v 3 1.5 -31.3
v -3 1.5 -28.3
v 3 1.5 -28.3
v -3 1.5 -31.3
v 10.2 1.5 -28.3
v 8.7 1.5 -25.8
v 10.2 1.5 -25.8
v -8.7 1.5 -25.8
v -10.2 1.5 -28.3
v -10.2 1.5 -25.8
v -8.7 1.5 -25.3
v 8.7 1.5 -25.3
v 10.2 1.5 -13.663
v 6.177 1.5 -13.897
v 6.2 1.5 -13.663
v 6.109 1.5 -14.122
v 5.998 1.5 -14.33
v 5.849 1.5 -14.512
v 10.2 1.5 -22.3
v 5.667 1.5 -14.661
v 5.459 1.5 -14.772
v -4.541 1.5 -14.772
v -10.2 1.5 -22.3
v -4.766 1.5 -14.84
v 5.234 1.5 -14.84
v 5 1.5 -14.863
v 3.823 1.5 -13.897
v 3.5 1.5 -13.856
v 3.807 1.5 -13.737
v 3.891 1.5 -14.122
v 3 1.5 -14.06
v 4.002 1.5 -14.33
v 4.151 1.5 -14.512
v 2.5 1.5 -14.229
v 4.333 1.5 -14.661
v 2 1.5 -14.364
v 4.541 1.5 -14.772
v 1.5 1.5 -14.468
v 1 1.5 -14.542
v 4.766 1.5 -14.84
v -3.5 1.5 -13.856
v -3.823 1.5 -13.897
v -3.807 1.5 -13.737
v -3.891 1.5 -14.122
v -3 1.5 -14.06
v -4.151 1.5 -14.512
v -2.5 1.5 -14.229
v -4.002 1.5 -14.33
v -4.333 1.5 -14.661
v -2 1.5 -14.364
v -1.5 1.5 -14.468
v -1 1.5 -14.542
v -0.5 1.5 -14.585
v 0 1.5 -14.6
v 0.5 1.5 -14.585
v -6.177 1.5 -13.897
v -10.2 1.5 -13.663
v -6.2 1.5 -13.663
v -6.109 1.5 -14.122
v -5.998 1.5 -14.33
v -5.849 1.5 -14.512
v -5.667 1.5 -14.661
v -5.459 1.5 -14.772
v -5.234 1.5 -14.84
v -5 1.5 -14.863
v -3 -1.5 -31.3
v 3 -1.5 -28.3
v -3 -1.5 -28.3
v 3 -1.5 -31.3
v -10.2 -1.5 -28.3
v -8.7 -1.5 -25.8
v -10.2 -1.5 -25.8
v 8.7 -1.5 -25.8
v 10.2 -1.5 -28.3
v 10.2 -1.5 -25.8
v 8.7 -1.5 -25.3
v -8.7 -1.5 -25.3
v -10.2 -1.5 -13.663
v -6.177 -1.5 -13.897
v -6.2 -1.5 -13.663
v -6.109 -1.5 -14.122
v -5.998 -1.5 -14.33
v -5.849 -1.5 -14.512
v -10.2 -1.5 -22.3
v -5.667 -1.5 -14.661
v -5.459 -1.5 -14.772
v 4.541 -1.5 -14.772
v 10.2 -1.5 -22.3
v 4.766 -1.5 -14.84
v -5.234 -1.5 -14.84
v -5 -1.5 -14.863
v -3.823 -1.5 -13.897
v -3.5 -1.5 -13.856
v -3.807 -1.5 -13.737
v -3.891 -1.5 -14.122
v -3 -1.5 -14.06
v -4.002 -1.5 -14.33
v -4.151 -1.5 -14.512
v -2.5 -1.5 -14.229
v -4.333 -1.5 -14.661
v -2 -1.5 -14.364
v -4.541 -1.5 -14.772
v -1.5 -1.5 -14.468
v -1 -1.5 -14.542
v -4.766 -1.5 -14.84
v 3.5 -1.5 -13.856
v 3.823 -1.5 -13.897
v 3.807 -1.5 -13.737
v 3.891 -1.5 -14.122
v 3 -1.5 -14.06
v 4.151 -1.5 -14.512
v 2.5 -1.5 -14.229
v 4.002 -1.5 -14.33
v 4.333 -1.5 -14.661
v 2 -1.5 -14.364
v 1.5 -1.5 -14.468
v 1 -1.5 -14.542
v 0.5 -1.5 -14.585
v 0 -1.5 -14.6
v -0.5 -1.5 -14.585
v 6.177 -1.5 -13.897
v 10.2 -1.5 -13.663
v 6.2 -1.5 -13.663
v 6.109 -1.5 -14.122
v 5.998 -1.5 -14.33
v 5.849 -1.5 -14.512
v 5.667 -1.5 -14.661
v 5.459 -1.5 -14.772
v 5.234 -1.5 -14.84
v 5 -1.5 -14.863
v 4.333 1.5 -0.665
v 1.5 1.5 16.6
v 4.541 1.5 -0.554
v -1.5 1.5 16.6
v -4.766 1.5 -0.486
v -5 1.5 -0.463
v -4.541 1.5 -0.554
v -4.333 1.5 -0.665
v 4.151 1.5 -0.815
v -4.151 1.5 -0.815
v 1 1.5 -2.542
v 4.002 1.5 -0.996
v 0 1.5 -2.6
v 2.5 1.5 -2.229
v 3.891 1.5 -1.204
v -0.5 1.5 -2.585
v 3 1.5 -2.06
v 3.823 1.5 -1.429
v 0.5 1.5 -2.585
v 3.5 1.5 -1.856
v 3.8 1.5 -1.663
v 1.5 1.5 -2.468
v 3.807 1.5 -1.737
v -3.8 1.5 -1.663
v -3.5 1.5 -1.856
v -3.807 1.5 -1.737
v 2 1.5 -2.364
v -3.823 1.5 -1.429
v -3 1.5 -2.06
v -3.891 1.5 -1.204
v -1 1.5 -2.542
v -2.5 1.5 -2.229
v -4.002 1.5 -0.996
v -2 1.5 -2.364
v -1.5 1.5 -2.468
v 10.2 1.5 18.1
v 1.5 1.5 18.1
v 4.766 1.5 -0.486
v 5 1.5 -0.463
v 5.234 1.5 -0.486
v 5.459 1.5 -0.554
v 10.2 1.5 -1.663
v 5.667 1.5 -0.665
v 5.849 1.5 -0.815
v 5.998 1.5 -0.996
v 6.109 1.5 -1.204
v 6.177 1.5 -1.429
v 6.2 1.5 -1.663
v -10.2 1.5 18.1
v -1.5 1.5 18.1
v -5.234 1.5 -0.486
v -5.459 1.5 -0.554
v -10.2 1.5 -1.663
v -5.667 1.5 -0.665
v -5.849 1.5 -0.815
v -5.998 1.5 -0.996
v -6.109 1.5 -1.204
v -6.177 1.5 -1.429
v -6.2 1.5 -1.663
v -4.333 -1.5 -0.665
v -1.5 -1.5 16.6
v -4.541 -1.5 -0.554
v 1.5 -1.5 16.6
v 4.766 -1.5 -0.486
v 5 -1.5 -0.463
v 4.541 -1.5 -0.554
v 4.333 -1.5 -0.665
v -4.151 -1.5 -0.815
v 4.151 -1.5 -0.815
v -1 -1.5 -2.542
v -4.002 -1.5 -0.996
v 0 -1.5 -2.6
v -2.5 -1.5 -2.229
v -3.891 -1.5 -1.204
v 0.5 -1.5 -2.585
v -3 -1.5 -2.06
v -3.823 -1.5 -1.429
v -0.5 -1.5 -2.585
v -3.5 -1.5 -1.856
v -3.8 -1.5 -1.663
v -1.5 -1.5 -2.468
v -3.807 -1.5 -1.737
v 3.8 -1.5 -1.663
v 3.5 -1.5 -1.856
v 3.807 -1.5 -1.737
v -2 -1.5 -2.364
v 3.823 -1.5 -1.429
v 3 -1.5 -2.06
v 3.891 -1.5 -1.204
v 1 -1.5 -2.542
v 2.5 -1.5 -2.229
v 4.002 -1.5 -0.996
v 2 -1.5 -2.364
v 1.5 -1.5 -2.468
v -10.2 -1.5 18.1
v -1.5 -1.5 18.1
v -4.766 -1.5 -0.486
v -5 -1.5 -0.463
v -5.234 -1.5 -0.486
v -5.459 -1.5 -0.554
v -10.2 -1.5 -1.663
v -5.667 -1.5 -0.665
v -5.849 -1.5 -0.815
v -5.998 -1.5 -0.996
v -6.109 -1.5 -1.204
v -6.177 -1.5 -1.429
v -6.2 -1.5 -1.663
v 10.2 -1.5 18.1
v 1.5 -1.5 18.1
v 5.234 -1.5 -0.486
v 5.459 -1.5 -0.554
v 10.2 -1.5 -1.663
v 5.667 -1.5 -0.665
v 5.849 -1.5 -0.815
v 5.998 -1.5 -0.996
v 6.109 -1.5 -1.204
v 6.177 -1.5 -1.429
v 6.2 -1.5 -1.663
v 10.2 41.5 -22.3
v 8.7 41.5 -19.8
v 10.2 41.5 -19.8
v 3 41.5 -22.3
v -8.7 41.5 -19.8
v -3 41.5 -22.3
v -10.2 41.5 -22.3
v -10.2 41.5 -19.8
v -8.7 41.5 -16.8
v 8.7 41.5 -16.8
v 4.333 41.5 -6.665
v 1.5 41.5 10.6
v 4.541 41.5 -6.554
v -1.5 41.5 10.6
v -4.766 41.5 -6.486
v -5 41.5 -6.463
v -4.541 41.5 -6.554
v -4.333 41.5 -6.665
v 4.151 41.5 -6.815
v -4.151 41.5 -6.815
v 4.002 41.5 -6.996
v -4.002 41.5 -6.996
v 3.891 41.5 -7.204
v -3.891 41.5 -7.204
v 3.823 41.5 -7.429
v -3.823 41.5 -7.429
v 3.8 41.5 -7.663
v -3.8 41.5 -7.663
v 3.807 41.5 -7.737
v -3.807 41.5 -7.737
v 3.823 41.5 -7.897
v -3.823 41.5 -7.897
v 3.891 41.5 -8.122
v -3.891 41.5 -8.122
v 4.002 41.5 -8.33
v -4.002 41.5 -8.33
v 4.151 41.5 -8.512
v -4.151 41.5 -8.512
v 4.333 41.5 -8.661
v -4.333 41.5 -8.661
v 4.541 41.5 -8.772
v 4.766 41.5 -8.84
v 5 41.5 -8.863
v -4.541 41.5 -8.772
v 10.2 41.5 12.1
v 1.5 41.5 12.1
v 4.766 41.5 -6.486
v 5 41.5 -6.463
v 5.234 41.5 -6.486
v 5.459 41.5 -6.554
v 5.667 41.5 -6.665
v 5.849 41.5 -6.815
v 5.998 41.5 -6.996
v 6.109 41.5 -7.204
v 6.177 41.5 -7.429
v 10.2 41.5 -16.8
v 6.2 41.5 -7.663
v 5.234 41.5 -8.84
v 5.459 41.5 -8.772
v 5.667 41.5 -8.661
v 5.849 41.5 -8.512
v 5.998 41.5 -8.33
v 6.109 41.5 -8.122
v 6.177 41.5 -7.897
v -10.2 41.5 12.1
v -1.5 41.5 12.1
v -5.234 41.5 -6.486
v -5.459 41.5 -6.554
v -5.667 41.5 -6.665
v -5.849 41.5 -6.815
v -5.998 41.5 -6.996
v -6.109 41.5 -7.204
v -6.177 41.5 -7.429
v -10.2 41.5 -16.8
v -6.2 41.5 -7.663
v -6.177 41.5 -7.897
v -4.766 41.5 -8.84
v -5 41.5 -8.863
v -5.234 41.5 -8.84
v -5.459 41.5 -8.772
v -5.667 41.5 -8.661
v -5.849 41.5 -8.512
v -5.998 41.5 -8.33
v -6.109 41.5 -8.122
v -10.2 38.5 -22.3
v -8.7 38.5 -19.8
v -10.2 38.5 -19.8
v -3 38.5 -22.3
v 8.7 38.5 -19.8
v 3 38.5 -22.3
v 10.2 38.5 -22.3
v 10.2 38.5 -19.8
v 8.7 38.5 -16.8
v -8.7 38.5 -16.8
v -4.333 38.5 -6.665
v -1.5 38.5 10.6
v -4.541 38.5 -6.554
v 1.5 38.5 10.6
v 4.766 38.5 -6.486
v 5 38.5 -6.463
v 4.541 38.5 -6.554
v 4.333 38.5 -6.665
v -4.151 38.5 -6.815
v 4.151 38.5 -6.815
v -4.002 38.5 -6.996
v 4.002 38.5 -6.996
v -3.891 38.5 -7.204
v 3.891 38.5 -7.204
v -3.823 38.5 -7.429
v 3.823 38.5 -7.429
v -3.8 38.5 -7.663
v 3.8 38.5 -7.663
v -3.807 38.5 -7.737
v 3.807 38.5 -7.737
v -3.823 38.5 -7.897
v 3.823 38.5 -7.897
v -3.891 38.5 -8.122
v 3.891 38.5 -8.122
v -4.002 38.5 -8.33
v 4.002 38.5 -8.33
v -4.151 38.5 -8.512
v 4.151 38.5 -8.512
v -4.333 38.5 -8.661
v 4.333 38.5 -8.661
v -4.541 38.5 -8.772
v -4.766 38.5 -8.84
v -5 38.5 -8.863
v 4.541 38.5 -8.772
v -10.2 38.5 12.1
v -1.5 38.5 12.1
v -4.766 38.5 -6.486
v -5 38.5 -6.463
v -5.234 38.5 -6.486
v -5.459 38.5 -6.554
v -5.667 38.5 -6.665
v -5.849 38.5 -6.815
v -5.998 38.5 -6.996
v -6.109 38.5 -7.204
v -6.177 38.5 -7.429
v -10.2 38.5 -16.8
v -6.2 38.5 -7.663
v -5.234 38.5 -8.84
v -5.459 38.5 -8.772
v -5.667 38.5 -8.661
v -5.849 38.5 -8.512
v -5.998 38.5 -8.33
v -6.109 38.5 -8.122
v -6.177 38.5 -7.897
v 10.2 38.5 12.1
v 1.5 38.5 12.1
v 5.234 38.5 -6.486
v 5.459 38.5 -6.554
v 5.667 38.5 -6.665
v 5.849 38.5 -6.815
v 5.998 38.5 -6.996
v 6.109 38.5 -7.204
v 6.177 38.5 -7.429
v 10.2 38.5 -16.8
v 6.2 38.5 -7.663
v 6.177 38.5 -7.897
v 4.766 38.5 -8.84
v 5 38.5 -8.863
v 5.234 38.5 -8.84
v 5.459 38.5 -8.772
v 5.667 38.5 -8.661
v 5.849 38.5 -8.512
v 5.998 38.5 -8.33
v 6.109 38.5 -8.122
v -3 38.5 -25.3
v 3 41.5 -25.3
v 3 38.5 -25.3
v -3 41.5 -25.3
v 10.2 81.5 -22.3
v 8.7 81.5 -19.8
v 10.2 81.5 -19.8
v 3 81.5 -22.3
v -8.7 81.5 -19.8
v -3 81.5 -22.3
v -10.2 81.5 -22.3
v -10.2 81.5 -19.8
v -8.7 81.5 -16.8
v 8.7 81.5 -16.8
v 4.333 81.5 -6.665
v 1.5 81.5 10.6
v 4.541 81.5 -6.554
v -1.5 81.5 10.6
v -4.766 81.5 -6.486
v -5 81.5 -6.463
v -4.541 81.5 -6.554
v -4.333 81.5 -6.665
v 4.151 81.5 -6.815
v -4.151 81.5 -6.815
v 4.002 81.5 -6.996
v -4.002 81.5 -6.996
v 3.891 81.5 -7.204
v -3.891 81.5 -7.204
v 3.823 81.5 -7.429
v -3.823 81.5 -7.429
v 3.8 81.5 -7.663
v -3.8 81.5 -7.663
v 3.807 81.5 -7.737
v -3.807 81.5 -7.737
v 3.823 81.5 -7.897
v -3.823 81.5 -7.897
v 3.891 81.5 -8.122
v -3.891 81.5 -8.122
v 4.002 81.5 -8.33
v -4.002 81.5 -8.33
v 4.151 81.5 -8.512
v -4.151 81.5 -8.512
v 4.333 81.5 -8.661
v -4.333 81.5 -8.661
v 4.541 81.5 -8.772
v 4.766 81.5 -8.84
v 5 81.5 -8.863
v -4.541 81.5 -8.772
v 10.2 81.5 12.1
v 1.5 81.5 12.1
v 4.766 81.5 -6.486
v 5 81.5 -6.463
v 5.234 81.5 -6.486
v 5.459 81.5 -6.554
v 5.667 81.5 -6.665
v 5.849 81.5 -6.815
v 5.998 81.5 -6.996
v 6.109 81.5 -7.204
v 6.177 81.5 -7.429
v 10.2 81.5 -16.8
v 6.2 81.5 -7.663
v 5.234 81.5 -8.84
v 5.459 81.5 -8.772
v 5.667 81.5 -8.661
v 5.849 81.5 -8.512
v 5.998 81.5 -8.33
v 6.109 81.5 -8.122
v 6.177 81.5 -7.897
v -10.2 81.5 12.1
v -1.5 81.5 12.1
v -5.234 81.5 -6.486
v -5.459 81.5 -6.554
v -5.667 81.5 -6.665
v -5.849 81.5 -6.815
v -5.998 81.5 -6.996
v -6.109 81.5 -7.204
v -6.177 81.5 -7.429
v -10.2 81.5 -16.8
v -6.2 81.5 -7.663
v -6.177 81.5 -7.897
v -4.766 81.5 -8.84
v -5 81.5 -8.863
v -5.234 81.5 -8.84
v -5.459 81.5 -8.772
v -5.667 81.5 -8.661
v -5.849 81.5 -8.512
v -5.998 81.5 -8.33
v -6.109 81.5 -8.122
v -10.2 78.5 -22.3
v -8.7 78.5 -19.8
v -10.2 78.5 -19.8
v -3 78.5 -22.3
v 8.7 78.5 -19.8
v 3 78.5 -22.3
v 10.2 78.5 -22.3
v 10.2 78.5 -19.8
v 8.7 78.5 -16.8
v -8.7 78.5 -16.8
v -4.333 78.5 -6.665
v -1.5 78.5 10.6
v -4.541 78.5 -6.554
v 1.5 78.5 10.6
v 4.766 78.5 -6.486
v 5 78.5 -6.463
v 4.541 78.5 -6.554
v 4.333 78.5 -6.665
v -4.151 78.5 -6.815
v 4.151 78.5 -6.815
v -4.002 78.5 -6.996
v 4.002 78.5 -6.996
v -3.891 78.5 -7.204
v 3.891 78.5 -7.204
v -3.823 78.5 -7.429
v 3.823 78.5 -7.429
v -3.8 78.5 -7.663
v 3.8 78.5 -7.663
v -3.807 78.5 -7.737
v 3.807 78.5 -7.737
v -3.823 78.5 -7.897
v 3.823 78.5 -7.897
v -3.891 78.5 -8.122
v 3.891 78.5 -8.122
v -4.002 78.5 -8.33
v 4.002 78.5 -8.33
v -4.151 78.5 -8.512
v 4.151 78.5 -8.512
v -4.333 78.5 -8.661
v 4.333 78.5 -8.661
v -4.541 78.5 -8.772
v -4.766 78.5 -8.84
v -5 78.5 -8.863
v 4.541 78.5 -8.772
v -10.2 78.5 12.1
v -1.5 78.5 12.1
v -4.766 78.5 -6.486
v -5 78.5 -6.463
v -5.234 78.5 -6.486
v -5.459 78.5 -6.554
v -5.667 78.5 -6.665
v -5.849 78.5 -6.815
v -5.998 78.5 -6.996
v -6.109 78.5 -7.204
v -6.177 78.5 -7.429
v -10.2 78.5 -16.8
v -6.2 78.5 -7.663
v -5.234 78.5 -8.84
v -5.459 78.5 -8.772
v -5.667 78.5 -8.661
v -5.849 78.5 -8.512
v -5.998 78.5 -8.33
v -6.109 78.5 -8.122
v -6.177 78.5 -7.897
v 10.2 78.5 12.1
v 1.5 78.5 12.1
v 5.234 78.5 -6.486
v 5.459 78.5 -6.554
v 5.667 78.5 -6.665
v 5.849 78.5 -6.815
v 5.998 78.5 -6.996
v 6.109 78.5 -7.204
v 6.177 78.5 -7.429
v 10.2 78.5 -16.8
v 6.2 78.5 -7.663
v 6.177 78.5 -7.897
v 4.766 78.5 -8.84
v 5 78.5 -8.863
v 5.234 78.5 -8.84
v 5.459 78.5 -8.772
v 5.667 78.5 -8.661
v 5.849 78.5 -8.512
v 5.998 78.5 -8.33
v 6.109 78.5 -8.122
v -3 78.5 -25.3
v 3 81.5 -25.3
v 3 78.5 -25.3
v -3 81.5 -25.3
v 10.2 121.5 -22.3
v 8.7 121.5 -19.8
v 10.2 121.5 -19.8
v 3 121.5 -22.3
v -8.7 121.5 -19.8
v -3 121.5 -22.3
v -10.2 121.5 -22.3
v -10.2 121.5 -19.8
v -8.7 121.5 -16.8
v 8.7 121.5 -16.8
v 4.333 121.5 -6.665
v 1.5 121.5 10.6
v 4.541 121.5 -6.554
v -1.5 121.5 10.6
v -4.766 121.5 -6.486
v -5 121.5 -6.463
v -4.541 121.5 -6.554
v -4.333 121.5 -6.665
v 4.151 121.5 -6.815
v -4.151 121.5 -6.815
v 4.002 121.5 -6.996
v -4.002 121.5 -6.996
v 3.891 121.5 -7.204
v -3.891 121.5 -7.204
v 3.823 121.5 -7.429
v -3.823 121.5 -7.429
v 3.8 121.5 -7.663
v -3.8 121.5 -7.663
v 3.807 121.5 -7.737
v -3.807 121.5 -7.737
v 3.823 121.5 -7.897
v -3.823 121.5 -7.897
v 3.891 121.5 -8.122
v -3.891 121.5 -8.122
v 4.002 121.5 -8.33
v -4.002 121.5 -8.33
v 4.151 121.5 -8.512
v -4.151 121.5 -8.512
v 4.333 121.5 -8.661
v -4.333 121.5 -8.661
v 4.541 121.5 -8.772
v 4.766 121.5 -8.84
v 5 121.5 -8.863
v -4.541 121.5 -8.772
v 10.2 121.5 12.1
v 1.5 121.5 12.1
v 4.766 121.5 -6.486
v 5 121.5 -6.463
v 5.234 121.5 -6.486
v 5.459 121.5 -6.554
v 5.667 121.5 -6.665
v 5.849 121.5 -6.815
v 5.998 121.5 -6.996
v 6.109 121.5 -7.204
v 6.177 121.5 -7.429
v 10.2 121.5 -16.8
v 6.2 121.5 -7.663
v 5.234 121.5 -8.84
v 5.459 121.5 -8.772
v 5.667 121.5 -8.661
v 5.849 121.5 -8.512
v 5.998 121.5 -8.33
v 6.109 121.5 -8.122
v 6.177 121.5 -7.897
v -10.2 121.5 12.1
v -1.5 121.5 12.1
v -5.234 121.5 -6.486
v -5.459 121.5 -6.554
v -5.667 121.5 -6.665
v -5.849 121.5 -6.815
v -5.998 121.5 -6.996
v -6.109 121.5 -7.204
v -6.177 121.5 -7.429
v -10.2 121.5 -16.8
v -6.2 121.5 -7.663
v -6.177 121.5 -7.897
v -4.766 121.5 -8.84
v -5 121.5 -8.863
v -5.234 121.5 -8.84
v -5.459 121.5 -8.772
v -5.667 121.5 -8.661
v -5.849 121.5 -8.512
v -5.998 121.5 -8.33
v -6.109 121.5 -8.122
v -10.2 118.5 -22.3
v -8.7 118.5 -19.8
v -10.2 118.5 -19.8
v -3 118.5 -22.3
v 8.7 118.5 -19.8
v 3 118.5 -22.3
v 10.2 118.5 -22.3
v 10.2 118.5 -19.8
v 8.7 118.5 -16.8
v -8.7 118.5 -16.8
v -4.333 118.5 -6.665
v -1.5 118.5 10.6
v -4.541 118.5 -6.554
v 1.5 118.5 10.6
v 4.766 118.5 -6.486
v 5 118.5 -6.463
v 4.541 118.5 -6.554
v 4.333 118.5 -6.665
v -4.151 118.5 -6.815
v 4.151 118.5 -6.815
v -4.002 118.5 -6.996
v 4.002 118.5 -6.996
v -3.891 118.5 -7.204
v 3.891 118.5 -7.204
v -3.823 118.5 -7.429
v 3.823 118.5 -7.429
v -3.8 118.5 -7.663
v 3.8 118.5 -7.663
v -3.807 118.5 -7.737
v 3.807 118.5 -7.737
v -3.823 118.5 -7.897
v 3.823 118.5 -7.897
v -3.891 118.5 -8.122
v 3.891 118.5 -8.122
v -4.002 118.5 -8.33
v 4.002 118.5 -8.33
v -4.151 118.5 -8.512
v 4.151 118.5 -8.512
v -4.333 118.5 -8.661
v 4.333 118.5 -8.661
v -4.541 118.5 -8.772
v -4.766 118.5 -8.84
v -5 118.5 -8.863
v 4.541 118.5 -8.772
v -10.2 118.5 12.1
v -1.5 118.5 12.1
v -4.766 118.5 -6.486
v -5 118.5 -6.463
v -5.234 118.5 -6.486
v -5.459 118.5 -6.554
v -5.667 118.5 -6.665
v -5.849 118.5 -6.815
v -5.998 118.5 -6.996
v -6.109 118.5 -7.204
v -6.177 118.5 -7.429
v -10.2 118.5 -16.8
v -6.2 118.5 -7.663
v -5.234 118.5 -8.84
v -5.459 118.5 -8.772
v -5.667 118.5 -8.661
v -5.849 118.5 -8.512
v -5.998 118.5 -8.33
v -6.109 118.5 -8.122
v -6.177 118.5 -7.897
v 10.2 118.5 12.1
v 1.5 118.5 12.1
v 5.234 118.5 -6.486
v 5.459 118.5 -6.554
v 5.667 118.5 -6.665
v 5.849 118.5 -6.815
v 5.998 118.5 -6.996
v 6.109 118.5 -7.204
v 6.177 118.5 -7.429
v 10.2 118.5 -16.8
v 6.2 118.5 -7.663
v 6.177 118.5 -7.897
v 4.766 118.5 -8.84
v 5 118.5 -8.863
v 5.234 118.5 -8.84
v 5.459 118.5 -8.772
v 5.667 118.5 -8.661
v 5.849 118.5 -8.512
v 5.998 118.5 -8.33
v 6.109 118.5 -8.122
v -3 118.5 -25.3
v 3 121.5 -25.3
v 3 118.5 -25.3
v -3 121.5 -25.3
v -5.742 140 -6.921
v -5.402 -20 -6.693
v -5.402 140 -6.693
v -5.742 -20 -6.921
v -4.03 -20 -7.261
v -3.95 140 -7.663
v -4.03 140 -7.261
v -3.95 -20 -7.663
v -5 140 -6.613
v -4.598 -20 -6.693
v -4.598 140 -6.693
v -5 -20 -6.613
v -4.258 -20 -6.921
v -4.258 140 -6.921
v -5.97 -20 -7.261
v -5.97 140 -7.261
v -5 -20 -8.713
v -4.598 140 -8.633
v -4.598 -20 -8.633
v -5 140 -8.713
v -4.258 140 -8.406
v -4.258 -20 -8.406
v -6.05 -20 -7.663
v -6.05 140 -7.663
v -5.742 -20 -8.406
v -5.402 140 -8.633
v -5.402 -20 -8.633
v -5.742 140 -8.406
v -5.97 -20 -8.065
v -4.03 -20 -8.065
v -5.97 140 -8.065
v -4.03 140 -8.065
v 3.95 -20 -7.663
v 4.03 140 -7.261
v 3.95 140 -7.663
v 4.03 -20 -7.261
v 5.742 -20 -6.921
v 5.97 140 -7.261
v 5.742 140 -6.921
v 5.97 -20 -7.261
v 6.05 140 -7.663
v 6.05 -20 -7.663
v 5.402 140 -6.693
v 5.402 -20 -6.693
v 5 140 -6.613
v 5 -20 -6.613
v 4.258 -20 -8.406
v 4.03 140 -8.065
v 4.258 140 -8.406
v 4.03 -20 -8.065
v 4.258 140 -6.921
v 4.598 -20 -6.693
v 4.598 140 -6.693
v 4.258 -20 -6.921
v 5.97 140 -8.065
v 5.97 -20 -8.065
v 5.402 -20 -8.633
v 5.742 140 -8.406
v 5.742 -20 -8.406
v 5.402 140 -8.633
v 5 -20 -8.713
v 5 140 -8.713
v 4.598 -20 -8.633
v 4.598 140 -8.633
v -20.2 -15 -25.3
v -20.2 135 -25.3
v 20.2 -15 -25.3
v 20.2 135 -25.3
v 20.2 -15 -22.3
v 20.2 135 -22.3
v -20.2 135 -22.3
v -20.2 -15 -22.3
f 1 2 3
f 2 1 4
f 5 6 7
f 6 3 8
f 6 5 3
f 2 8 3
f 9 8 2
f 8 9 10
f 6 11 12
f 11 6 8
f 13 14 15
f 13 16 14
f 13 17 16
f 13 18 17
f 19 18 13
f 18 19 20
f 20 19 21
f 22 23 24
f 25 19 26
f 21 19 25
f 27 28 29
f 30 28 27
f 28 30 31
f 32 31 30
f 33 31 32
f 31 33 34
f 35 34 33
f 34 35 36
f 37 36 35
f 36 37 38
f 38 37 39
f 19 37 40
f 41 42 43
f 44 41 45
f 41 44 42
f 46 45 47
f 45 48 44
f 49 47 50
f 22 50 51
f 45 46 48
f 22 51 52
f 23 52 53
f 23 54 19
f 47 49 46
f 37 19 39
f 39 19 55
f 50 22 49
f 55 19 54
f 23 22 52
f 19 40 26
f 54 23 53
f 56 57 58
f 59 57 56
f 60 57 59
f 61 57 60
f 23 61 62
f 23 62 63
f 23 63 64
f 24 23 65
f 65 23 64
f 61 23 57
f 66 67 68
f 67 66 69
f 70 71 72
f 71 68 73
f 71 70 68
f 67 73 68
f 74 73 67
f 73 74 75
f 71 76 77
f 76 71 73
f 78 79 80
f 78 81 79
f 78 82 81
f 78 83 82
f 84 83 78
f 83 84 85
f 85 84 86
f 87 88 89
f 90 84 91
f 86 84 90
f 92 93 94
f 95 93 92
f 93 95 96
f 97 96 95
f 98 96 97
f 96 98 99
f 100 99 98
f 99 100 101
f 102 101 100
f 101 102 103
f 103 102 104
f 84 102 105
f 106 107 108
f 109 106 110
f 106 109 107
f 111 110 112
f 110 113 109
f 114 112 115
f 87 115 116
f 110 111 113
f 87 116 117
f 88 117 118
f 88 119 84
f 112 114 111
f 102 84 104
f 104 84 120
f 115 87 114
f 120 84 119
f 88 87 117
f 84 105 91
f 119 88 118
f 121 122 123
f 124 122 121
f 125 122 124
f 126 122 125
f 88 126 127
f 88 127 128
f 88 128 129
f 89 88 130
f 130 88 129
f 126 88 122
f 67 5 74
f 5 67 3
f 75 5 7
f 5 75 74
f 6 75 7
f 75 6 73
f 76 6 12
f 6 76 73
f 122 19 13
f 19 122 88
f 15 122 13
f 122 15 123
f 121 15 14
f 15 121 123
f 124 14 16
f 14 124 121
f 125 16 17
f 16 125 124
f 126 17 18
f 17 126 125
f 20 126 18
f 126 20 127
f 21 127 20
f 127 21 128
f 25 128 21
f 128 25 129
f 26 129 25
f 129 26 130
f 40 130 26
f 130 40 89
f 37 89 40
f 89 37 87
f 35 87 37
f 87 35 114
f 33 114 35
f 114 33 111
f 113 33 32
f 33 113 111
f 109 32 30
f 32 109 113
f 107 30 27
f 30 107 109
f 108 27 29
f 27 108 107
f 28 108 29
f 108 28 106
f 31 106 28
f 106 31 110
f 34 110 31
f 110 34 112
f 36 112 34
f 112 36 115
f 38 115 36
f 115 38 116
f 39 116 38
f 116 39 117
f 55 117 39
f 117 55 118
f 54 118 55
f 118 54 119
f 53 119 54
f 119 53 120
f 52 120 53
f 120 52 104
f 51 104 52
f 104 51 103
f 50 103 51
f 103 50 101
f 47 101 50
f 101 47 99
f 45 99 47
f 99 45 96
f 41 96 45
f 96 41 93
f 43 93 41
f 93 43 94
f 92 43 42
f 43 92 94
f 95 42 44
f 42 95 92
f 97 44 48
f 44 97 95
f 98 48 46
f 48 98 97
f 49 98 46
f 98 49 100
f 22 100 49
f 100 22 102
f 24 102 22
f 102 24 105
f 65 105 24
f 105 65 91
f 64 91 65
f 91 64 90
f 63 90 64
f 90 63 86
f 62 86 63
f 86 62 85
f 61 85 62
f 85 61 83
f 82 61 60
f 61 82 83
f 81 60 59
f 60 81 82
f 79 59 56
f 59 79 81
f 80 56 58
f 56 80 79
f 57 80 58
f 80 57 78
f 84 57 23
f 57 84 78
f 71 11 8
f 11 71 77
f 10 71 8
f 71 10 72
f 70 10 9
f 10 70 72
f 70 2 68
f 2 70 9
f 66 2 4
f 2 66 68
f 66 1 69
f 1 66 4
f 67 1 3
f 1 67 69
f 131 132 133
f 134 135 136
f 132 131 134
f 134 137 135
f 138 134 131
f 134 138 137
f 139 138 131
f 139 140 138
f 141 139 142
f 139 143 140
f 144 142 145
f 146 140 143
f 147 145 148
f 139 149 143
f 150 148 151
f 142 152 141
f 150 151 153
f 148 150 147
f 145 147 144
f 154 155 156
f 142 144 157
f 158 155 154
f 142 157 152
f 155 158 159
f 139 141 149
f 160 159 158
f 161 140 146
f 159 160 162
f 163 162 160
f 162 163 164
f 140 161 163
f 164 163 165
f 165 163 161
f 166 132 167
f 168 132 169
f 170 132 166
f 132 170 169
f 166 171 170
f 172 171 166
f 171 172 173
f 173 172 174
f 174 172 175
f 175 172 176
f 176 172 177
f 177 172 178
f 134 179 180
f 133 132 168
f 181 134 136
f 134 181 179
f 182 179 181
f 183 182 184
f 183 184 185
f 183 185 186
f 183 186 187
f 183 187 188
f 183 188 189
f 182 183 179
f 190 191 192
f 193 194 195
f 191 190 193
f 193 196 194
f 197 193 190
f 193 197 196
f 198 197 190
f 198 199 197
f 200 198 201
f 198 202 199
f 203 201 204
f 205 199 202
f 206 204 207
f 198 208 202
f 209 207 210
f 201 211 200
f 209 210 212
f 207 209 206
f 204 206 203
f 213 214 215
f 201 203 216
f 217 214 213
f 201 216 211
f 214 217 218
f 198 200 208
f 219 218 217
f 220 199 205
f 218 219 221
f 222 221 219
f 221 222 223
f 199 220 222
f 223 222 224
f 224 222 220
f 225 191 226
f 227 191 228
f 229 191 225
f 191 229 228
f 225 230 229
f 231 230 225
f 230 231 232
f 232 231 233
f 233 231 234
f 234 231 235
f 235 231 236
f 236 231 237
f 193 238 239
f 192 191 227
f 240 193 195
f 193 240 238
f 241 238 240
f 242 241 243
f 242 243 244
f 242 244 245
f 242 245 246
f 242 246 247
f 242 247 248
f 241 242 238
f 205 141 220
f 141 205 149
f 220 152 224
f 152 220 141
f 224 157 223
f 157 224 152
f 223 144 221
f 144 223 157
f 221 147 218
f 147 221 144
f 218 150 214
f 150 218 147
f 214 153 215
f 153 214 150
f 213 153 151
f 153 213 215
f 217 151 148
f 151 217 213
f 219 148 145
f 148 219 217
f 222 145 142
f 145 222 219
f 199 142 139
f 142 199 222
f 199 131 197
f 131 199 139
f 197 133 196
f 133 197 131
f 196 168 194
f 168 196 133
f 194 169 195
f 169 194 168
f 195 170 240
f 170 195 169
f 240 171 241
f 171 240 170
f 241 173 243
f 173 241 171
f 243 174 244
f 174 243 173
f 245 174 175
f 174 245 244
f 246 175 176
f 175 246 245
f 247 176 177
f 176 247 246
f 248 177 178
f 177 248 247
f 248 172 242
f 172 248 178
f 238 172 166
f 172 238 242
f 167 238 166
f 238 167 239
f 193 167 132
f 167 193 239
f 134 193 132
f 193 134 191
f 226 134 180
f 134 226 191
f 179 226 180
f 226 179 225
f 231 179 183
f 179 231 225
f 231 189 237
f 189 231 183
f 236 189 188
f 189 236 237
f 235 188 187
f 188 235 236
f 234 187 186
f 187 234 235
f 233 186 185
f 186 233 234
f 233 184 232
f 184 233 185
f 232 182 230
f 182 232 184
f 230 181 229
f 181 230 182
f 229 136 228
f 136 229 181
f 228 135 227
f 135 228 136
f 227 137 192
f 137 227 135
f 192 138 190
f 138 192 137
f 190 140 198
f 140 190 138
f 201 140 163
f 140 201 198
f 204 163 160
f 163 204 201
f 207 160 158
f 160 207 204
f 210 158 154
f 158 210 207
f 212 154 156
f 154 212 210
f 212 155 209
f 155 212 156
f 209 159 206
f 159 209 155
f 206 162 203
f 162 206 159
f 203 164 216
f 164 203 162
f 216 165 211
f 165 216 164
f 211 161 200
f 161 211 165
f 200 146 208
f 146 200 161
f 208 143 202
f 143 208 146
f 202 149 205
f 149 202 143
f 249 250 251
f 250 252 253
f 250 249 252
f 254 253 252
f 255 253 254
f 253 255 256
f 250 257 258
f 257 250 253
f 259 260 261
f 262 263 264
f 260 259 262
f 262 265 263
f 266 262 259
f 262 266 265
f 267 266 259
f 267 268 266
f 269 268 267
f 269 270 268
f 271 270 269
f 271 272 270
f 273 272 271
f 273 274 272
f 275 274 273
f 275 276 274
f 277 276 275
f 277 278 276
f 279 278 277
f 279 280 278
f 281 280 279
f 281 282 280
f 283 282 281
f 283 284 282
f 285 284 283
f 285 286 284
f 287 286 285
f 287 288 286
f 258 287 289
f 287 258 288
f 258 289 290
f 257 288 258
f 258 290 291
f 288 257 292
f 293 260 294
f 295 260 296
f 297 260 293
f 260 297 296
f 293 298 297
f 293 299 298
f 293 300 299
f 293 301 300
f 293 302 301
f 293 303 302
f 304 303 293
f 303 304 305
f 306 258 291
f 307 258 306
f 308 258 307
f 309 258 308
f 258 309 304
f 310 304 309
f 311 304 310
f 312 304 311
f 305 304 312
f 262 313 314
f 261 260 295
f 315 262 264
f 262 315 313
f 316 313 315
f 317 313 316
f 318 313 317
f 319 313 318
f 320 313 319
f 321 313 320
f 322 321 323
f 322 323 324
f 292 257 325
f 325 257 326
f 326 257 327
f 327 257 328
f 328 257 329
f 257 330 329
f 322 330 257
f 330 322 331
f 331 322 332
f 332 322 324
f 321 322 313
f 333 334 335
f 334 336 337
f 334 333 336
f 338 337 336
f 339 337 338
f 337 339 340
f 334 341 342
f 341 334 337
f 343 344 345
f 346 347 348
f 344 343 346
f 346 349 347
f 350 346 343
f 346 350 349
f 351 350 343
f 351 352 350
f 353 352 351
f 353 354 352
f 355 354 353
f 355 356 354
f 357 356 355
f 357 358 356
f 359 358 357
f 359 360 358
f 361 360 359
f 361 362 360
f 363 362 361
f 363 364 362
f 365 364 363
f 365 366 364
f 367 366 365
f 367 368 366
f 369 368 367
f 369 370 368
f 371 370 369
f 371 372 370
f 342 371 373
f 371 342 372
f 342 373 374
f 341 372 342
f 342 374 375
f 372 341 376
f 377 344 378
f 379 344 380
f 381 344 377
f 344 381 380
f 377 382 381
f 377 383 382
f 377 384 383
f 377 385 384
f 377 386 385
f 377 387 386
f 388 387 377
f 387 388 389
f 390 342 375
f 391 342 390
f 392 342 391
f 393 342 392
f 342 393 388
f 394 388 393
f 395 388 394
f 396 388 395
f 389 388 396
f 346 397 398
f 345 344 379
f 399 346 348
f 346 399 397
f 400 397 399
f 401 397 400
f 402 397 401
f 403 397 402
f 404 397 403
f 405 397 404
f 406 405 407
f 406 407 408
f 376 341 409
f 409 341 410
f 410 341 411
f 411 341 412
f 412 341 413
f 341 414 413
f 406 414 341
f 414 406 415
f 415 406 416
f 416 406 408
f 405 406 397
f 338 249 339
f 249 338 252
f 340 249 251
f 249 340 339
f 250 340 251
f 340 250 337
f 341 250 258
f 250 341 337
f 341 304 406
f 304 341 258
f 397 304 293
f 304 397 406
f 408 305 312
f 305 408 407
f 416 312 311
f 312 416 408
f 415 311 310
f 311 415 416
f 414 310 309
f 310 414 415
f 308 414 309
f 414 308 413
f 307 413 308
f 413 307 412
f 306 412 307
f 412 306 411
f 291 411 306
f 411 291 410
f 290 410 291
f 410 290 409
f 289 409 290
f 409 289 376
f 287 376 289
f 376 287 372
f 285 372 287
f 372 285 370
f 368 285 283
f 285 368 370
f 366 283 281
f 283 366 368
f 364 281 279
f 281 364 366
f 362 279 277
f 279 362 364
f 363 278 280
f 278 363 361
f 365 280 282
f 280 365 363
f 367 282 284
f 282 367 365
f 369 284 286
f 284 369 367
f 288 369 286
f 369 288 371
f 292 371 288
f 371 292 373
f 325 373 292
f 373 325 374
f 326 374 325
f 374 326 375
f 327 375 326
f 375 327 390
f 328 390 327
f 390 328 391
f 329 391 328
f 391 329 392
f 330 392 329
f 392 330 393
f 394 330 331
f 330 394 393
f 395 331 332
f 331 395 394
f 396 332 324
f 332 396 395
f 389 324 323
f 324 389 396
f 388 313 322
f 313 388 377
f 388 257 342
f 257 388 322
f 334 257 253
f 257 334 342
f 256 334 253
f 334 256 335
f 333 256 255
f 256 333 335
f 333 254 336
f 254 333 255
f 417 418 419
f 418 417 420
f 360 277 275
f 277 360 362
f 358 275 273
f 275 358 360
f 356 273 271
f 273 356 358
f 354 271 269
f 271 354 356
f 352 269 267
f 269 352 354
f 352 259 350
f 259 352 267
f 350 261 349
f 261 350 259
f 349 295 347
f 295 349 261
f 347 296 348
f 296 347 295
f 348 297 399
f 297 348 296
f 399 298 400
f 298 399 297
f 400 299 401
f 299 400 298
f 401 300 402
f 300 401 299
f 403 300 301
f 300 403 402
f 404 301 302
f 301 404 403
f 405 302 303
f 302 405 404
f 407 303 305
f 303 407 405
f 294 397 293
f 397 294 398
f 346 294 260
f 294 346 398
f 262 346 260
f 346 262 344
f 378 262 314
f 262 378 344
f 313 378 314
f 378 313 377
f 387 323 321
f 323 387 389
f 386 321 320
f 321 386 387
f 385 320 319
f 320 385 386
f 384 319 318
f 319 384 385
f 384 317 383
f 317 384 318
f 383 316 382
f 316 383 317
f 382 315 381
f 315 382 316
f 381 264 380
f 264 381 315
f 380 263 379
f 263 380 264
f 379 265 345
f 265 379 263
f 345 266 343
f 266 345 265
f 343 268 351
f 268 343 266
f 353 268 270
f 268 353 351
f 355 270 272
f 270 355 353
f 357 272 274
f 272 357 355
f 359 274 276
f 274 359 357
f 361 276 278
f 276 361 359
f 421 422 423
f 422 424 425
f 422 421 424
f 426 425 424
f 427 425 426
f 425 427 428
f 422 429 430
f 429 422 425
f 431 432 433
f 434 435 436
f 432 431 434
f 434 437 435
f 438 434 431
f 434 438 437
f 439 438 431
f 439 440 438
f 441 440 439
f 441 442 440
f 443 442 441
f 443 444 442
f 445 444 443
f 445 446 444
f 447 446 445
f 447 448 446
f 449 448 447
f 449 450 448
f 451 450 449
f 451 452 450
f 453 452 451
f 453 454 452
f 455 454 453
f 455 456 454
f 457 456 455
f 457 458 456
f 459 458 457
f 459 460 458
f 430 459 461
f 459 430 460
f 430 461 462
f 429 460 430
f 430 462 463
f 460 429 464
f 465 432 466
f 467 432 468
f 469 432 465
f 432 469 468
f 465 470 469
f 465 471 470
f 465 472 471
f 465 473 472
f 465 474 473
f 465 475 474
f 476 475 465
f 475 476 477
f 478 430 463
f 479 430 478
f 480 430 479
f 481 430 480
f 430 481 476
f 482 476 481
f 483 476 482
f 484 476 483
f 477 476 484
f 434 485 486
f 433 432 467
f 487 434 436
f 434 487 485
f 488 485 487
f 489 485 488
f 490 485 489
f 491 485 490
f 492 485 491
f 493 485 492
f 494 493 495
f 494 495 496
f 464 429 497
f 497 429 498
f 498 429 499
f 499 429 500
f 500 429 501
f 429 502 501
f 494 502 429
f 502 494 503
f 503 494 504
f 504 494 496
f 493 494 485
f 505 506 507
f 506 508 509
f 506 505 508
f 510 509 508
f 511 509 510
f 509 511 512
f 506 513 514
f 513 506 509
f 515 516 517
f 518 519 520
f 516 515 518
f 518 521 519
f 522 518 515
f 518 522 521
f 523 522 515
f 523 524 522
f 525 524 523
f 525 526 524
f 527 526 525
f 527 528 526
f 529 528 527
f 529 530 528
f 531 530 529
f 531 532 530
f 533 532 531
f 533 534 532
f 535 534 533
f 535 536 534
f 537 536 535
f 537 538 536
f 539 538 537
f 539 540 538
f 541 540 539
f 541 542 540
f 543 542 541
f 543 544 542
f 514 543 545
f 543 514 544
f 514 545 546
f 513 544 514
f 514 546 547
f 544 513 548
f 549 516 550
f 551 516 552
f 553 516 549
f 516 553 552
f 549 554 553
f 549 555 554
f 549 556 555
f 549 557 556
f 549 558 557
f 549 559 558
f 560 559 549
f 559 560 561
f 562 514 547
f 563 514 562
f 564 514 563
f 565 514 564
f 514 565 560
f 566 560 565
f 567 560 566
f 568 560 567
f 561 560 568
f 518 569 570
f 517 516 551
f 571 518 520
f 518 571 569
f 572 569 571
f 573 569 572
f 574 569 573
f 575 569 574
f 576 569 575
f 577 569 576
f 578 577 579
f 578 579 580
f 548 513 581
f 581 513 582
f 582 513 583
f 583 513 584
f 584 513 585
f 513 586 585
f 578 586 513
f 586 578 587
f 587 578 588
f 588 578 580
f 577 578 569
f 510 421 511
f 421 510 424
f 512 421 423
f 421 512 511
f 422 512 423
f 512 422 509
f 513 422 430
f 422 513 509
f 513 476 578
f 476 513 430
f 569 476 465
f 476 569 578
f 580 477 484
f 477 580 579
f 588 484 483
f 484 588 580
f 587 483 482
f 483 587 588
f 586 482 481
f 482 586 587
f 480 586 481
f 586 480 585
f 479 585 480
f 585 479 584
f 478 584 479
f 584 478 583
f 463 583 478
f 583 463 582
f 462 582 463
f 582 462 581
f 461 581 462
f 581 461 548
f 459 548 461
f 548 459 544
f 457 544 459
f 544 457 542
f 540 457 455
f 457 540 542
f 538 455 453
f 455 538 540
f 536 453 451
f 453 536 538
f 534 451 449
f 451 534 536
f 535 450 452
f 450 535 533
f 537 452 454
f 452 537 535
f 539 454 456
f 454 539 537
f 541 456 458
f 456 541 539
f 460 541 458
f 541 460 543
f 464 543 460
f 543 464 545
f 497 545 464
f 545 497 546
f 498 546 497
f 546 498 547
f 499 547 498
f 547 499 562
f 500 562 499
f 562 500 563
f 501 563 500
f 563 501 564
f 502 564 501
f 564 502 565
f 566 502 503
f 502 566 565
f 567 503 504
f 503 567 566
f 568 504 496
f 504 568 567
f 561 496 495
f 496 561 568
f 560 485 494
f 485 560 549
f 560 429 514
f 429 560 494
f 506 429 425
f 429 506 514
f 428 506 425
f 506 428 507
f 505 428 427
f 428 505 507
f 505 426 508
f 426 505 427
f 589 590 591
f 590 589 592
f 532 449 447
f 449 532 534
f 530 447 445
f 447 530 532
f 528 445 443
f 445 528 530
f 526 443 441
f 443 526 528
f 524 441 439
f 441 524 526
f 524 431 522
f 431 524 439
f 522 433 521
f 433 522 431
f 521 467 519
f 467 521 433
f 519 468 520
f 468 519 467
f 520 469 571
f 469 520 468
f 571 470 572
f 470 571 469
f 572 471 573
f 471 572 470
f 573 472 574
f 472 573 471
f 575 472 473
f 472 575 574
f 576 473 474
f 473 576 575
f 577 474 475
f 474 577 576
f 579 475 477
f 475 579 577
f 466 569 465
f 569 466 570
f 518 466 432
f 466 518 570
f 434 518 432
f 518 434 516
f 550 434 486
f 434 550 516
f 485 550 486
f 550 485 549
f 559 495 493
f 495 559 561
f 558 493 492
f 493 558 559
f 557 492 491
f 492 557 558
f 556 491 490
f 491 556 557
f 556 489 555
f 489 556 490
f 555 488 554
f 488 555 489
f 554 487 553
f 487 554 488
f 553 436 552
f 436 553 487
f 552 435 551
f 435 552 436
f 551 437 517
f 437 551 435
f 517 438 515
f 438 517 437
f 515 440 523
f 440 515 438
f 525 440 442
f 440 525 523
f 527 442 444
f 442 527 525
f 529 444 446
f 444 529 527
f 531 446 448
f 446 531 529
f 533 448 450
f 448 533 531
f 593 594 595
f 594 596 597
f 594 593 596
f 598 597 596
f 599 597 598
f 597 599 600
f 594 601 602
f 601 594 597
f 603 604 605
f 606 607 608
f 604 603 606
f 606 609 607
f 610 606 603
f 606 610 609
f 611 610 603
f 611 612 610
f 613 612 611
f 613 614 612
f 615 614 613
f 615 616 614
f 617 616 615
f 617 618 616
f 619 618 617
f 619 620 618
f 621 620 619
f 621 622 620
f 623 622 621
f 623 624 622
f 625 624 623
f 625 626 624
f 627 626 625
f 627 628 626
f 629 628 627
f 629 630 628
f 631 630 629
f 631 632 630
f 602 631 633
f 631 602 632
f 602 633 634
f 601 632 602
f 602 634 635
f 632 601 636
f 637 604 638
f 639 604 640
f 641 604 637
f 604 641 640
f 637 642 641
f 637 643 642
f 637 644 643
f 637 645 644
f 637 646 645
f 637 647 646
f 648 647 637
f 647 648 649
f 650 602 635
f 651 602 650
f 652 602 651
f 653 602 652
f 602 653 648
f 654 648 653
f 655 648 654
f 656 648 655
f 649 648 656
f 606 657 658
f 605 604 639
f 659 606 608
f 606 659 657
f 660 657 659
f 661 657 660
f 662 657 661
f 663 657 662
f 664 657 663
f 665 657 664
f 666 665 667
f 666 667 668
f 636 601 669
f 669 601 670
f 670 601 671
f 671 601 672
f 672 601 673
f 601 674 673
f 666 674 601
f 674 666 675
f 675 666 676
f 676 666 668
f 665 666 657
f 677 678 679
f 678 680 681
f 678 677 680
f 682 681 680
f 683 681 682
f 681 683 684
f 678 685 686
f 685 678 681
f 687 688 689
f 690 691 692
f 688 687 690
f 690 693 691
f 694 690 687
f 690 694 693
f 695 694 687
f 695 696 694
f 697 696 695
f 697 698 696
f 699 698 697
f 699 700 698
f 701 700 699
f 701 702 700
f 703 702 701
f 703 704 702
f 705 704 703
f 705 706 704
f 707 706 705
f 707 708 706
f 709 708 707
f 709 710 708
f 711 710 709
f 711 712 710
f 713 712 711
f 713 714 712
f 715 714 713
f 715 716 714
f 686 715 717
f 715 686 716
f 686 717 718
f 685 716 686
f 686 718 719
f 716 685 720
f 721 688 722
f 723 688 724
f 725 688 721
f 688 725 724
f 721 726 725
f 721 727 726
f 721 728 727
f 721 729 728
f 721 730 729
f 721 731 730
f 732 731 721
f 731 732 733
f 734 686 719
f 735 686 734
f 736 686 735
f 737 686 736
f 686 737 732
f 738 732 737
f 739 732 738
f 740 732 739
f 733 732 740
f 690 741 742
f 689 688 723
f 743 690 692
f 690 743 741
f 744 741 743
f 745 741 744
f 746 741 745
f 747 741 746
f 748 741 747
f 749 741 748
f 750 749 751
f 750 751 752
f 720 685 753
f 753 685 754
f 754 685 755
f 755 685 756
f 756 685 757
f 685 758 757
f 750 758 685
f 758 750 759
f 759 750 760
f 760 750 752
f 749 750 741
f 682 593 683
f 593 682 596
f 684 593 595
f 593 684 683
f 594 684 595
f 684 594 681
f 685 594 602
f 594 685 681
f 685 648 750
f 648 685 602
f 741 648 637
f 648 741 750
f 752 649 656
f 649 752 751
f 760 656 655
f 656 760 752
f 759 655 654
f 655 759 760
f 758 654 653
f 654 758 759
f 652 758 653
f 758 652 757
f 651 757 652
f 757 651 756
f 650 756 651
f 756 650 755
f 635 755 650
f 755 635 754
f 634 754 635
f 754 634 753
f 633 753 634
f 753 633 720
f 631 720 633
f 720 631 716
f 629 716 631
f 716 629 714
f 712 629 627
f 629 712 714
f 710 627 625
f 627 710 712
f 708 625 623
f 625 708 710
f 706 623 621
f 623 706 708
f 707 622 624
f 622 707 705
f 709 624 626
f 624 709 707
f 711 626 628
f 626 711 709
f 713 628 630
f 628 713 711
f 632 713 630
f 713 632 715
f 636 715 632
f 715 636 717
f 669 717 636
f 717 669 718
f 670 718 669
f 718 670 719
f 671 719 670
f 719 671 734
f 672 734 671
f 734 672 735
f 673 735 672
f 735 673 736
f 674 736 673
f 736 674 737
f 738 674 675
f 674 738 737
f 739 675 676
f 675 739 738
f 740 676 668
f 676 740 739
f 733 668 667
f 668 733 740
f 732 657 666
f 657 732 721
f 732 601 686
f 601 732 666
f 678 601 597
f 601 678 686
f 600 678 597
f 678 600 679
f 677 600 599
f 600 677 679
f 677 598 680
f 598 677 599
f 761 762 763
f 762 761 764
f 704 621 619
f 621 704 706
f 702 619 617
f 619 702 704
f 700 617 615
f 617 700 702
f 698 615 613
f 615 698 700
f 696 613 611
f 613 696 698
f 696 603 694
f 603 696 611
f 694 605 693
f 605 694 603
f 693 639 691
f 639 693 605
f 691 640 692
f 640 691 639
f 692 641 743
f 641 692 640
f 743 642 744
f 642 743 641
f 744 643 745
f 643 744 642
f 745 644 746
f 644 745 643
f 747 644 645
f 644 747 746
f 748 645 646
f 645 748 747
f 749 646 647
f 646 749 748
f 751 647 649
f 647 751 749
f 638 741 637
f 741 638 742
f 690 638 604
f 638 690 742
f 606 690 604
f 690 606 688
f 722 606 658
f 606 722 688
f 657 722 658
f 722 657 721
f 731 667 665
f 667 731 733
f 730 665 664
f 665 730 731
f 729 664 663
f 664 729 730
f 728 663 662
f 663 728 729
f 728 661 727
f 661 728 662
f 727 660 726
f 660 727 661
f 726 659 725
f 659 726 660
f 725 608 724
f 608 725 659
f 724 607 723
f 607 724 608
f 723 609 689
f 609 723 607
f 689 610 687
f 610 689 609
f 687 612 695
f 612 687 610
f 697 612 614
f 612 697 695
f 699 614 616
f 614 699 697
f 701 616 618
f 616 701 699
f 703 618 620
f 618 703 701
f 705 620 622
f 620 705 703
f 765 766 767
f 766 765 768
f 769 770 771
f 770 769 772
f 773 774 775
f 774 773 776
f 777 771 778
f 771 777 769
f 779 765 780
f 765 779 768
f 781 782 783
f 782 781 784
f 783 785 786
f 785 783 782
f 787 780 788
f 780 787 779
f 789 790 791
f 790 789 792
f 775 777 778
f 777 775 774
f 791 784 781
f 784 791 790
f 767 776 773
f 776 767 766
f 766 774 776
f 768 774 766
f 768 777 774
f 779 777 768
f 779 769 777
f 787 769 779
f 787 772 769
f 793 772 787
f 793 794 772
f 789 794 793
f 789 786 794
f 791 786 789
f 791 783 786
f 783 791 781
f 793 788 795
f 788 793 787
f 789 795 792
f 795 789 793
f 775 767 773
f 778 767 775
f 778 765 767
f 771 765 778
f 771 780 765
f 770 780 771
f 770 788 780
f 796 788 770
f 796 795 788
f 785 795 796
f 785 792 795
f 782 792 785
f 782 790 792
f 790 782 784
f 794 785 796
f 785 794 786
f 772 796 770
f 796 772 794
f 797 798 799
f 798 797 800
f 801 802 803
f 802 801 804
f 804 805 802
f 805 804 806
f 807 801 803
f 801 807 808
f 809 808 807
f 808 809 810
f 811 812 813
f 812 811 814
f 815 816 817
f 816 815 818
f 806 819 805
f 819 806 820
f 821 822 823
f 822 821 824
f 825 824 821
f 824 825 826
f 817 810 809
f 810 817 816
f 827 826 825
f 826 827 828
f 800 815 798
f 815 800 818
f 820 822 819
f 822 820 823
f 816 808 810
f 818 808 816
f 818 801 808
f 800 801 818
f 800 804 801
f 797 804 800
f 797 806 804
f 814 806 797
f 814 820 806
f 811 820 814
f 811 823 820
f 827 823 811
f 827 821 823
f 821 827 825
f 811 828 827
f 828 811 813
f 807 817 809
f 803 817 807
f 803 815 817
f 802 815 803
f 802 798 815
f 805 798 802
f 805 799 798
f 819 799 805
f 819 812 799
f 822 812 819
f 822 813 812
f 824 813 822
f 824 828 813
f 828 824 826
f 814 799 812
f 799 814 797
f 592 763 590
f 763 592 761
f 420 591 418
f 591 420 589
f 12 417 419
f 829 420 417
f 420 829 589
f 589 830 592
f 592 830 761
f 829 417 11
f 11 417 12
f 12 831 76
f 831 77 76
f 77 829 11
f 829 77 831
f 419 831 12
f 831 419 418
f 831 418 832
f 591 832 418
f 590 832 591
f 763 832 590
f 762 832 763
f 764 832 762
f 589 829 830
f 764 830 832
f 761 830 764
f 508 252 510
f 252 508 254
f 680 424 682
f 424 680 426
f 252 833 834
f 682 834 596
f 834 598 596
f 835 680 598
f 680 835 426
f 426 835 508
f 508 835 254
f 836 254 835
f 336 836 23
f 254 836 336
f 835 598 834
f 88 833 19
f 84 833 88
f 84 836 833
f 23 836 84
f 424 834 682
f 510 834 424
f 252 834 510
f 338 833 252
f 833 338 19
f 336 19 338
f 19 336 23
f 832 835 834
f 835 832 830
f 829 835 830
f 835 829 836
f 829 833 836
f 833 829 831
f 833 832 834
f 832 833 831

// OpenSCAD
/*

Laser-cut wooden solder jig for wire marble track. Nothing snaps or flexes:
each jig "station" is a set of flat pieces whose edges meet exactly through
the rail centers, so every rail sits in a half-depth notch in each of two
neighboring pieces. The pieces come together around the wires and a rubber
band (in the notches on their outer edges) holds them shut.

Open styles (open2, rail3, channel4): 2 pieces per station.
  comb   - stands in a slotted base board; rails drop into its half notches.
           Its top edge dips under the marble, so the combs alone (keepers
           off) also work as a test stand you can roll marbles on.
  keeper - drops on top of the rails. Band over the keeper, hooked under the
           comb's side notches.

Enclosed styles (tube3, tube4): a core plus one outer piece per rail gap.
  core   - fills the inside of the tube, touching every rail. After the ties
           are soldered, turn it edge-on inside the tube and slide it out.
  outer pieces - one between each pair of neighboring rails; each pulls
           straight away from the marble center. The bottom one stands in
           the base board. Band around the whole station.

Wood chars instead of melting and doesn't sink the heat like aluminum did.
Solder ties midway between stations (station_pitch apart), not at them.

  openscad -o jig.svg      -D 'jig_part="straight_laser"' -D 'style="tube4"' marbles/wire_jig.scad
  openscad -o jig_etch.svg -D 'jig_part="straight_etch"'  -D 'style="tube4"' marbles/wire_jig.scad
  openscad -o view.png     -D 'jig_part="straight_view"'  marbles/wire_jig.scad

The *_etch layers engrave a station number on every piece and next to its
slot in the base board (stations on a sloped path all differ in height).

*/

include <wire_track.scad>
part = "none";

jig_part = "straight_view";

// Rail hole radius: wire plus a little play (kerf is compensated separately)
hole_r = wire_r + jig_clr;
// Room kept between the comb's top edge and a rolling marble
jig_mclr = 0.5;
// Solid wood around the rail holes
st_wall = 4;
// Room under the rails for the ties and your soldering iron
jig_floor_room = 10;
station_pitch = 40;
n_stations = 4;
band_w = 3;
band_d = 1.5;
label_size = 3.5;
sheet_w = 400;
sheet_h = 300;

// Rails sit this far above the base board, leaving room under them for ties
function rest_h(s) = former_r_max(track_rails(s)) + wire_od + jig_floor_room;

function rail_xy(s) = [for (rl=track_rails(s)) rail_pt(rl)];
function open_style(s) = !is_enclosed(track_rails(s));
function st_r(s) = max([for (rl=track_rails(s)) rl[1]]) + hole_r + st_wall;
function open_w(s) = 2 * (max([for (p=rail_xy(s)) abs(p[0])]) + hole_r + st_wall);
function keeper_top(s) = max(concat([marble_r + 4], [for (p=rail_xy(s)) p[1] + hole_r + st_wall]));
function n_pieces(s) = open_style(s) ? 2 : len(track_rails(s)) + 1;

// Comb/keeper parting line, left to right through every rail center; between
// rails it dips under the marble so the comb alone is a usable test stand.
function lerp_y(a, b, x) = a[1] + (b[1] - a[1]) * (x - a[0]) / (b[0] - a[0]);
function dip_y(x) = let(mr = marble_r + jig_mclr)
    abs(x) < mr ? -sqrt(mr * mr - x * x) : 1e9;
function parting(s, step=0.5) =
    let(p = sort_rails(rail_xy(s)), w = open_w(s), n = len(p))
    concat(
        [[-w/2, p[0][1]]],
        [for (i=[0:n-2]) each
            [for (x=[p[i][0] : step : p[i+1][0] - step/2])
                [x, min(lerp_y(p[i], p[i+1], x), dip_y(x))]]],
        [p[n-1], [w/2, p[n-1][1]]]);

module rail_holes(s) {
    for (p=rail_xy(s))
        translate(p) circle(r=hole_r, $fn=base_fn/2);
}

module base_tabs(x0, x1, base_y) {
    // one tab if the piece is narrow, else two
    w = x1 - x0;
    for (x=(w < 3 * jig_tab_w + 4 ? [(x0 + x1)/2] : [x0 + jig_tab_w/2 + 2, x1 - jig_tab_w/2 - 2]))
        translate([x - jig_tab_w/2, base_y - sheet_th])
            square([jig_tab_w, sheet_th + 0.01]);
}

function tab_xs(x0, x1) = let(w = x1 - x0)
    w < 3 * jig_tab_w + 4 ? [(x0 + x1)/2] : [x0 + jig_tab_w/2 + 2, x1 - jig_tab_w/2 - 2];

module band_notch(p, a) {
    translate(p) rotate([0, 0, a])
        square([band_w, 2 * band_d], center=true);
}

// --- open styles ---

module open_comb_2d(s, base_y) {
    w = open_w(s);
    difference() {
        union() {
            polygon(concat(parting(s), [[w/2, base_y], [-w/2, base_y]]));
            base_tabs(-w/2, w/2, base_y);
        }
        rail_holes(s);
        for (sx=[-1, 1])
            band_notch([sx * w/2, base_y + 4], 0);
    }
}

module open_keeper_2d(s) {
    w = open_w(s);
    t = keeper_top(s);
    difference() {
        polygon(concat(parting(s), [[w/2, t], [-w/2, t]]));
        rail_holes(s);
        band_notch([0, t], 0);
    }
}

// --- enclosed styles ---

module core_2d(s) {
    difference() {
        polygon(rail_xy(s));
        rail_holes(s);
    }
}

// Rail angles around the marble center, sorted, with the wrap-around one
function rail_as(s) = let(rs = track_rails(s)) [for (rl=rs) rl[0]];
// Piece k sits between rails k and k+1; returns [a0, a1] with a1 > a0
function sector(s, k) = let(a = rail_as(s), n = len(a), a0 = a[k], a1 = a[(k + 1) % n])
    [a0, a1 > a0 ? a1 : a1 + 360];
// The outer piece straddling straight down stands in the base board
function bottom_k(s) = let(n = len(rail_as(s)))
    [for (k=[0:n-1]) let(sc = sector(s, k)) if ((sc[0] <= 0 && sc[1] >= 0) || (sc[0] <= 360 && sc[1] >= 360)) k][0];
function foot_hw(s) = let(sc = sector(s, bottom_k(s)))
    st_r(s) * min(abs(sin(sc[0])), abs(sin(sc[1]))) - 1;

module wedge(a0, a1, r=300) {
    polygon(concat([[0, 0]], [for (i=[0:16]) pt(a0 + (a1 - a0) * i / 16, r)]));
}

module outer_2d(s, k, base_y) {
    sc = sector(s, k);
    r = st_r(s);
    fw = foot_hw(s);
    difference() {
        union() {
            intersection() {
                difference() {
                    circle(r=r, $fn=base_fn);
                    polygon(rail_xy(s));
                }
                wedge(sc[0], sc[1]);
            }
            if (k == bottom_k(s)) {
                translate([-fw, base_y])
                    square([2 * fw, base_y < -r ? -r + 3 - base_y : 0.01]);
                base_tabs(-fw, fw, base_y);
            }
        }
        rail_holes(s);
        // the bottom piece hooks the band at both ends; the rest carry it
        for (a=(k == bottom_k(s) ? [sc[0] + 10, sc[1] - 10] : [(sc[0] + sc[1]) / 2]))
            band_notch(pt(a, r), a);
    }
}

// --- stations ---

// Piece i of a station whose rails rest base_h above the base board
// (0 = the piece that stands in the board).
module piece_2d(s, i, base_h) {
    base_y = -base_h;
    if (open_style(s)) {
        if (i == 0) open_comb_2d(s, base_y);
        else open_keeper_2d(s);
    } else {
        bk = bottom_k(s);
        n = len(rail_as(s));
        if (i == 0) outer_2d(s, bk, base_y);
        else if (i == n) core_2d(s);
        else outer_2d(s, (bk + i) % n, base_y);
    }
}

// x positions of a station's base tabs, in the station plane
function station_tab_xs(s) = open_style(s)
    ? tab_xs(-open_w(s)/2, open_w(s)/2)
    : tab_xs(-foot_hw(s), foot_hw(s));

// Station i of a straight, level jig
function straight_base_h(s) = rest_h(s);

module straight_base_2d(s) {
    w = open_style(s) ? open_w(s) + 20 : 2 * st_r(s) + 20;
    difference() {
        translate([-w/2, -15])
            square([w, (n_stations - 1) * station_pitch + 30]);
        for (i=[0:n_stations-1], x=station_tab_xs(s))
            translate([x, i * station_pitch])
                square([jig_tab_w, sheet_th], center=true);
    }
}

// Lay pieces out on a grid. items = [[style, piece, base_h, label], ...]
function cell_w(s) = (open_style(s) ? open_w(s) : 2 * st_r(s)) + 4;
function cell_h(s, base_h) = max(keeper_top(s), st_r(s)) + base_h + sheet_th + 4;

module straight_laser(s, etch=false) {
    items = [for (i=[0:n_stations-1], p=[0:n_pieces(s)-1]) [s, p, straight_base_h(s), str(i + 1)]];
    cw = cell_w(s);
    ch = cell_h(s, straight_base_h(s));
    bw = (open_style(s) ? open_w(s) : 2 * st_r(s)) + 20;
    cols = max(1, floor((sheet_w - bw - 10) / cw));
    if (!etch) {
        offset(delta=kerf/2) {
            translate([bw/2 + 5, 20]) straight_base_2d(s);
            for (j=[0:len(items)-1])
                translate([bw + 10 + (j % cols + 0.5) * cw,
                        5 + floor(j / cols) * ch + items[j][2] + sheet_th])
                    piece_2d(s, items[j][1], items[j][2]);
        }
    } else {
        for (i=[0:n_stations-1])
            translate([bw/2 + 5 + bw/2 - 8, 20 + i * station_pitch + 3])
                text(str(i + 1), size=label_size, halign="center");
        for (j=[0:len(items)-1])
            translate([bw + 10 + (j % cols + 0.5) * cw,
                    5 + floor(j / cols) * ch + items[j][2] + sheet_th])
                label_at(s, items[j][1], items[j][2], items[j][3]);
    }
}

// Station number engraved somewhere solid on each piece
module label_at(s, i, base_h, label) {
    p = open_style(s)
        ? (i == 0 ? [0, -base_h + 5] : [0, keeper_top(s) - 6])
        : (i == 0 ? [0, -base_h + 5] : [0, 0]);
    if (open_style(s) || i == 0 || i == len(rail_as(s)))
        translate(p) text(label, size=label_size, halign="center", valign="center");
}

module station_3d(s, base_h, explode=0) {
    for (i=[0:n_pieces(s)-1]) {
        // pull each piece away from the rails by `explode`
        d = open_style(s) ? [0, i == 0 ? -explode : explode]
            : i == len(rail_as(s)) ? [0, 0]
            : let(sc = sector(s, (bottom_k(s) + i) % len(rail_as(s)))) pt((sc[0] + sc[1]) / 2, explode);
        color(i == 0 ? "burlywood" : i == len(rail_as(s)) && !open_style(s) ? "peru" : "tan")
            translate(concat(d, -sheet_th/2))
            linear_extrude(sheet_th)
            piece_2d(s, i, base_h);
    }
}

module straight_view(s) {
    bh = straight_base_h(s);
    rotate([90, 0, 0]) {
        for (i=[0:n_stations-1])
            translate([0, 0, -i * station_pitch])
                station_3d(s, bh, i == 0 ? 6 : 0);
        color("silver")
            for (p=rail_xy(s))
                translate(concat(p, -(n_stations - 0.5) * station_pitch))
                    cylinder(r=wire_r, h=n_stations * station_pitch, $fn=base_fn/4);
    }
    color("burlywood")
        translate([0, 0, -bh - sheet_th])
        linear_extrude(sheet_th)
        straight_base_2d(s);
}

echo(jig_style=style, open=open_style(style), pieces_per_station=n_pieces(style),
    rest_h=rest_h(style));

if (jig_part == "straight_view") straight_view(style);
else if (jig_part == "straight_laser") straight_laser(style);
else if (jig_part == "straight_etch") straight_laser(style, etch=true);
else if (jig_part == "station") station_3d(style, rest_h(style), 6);
